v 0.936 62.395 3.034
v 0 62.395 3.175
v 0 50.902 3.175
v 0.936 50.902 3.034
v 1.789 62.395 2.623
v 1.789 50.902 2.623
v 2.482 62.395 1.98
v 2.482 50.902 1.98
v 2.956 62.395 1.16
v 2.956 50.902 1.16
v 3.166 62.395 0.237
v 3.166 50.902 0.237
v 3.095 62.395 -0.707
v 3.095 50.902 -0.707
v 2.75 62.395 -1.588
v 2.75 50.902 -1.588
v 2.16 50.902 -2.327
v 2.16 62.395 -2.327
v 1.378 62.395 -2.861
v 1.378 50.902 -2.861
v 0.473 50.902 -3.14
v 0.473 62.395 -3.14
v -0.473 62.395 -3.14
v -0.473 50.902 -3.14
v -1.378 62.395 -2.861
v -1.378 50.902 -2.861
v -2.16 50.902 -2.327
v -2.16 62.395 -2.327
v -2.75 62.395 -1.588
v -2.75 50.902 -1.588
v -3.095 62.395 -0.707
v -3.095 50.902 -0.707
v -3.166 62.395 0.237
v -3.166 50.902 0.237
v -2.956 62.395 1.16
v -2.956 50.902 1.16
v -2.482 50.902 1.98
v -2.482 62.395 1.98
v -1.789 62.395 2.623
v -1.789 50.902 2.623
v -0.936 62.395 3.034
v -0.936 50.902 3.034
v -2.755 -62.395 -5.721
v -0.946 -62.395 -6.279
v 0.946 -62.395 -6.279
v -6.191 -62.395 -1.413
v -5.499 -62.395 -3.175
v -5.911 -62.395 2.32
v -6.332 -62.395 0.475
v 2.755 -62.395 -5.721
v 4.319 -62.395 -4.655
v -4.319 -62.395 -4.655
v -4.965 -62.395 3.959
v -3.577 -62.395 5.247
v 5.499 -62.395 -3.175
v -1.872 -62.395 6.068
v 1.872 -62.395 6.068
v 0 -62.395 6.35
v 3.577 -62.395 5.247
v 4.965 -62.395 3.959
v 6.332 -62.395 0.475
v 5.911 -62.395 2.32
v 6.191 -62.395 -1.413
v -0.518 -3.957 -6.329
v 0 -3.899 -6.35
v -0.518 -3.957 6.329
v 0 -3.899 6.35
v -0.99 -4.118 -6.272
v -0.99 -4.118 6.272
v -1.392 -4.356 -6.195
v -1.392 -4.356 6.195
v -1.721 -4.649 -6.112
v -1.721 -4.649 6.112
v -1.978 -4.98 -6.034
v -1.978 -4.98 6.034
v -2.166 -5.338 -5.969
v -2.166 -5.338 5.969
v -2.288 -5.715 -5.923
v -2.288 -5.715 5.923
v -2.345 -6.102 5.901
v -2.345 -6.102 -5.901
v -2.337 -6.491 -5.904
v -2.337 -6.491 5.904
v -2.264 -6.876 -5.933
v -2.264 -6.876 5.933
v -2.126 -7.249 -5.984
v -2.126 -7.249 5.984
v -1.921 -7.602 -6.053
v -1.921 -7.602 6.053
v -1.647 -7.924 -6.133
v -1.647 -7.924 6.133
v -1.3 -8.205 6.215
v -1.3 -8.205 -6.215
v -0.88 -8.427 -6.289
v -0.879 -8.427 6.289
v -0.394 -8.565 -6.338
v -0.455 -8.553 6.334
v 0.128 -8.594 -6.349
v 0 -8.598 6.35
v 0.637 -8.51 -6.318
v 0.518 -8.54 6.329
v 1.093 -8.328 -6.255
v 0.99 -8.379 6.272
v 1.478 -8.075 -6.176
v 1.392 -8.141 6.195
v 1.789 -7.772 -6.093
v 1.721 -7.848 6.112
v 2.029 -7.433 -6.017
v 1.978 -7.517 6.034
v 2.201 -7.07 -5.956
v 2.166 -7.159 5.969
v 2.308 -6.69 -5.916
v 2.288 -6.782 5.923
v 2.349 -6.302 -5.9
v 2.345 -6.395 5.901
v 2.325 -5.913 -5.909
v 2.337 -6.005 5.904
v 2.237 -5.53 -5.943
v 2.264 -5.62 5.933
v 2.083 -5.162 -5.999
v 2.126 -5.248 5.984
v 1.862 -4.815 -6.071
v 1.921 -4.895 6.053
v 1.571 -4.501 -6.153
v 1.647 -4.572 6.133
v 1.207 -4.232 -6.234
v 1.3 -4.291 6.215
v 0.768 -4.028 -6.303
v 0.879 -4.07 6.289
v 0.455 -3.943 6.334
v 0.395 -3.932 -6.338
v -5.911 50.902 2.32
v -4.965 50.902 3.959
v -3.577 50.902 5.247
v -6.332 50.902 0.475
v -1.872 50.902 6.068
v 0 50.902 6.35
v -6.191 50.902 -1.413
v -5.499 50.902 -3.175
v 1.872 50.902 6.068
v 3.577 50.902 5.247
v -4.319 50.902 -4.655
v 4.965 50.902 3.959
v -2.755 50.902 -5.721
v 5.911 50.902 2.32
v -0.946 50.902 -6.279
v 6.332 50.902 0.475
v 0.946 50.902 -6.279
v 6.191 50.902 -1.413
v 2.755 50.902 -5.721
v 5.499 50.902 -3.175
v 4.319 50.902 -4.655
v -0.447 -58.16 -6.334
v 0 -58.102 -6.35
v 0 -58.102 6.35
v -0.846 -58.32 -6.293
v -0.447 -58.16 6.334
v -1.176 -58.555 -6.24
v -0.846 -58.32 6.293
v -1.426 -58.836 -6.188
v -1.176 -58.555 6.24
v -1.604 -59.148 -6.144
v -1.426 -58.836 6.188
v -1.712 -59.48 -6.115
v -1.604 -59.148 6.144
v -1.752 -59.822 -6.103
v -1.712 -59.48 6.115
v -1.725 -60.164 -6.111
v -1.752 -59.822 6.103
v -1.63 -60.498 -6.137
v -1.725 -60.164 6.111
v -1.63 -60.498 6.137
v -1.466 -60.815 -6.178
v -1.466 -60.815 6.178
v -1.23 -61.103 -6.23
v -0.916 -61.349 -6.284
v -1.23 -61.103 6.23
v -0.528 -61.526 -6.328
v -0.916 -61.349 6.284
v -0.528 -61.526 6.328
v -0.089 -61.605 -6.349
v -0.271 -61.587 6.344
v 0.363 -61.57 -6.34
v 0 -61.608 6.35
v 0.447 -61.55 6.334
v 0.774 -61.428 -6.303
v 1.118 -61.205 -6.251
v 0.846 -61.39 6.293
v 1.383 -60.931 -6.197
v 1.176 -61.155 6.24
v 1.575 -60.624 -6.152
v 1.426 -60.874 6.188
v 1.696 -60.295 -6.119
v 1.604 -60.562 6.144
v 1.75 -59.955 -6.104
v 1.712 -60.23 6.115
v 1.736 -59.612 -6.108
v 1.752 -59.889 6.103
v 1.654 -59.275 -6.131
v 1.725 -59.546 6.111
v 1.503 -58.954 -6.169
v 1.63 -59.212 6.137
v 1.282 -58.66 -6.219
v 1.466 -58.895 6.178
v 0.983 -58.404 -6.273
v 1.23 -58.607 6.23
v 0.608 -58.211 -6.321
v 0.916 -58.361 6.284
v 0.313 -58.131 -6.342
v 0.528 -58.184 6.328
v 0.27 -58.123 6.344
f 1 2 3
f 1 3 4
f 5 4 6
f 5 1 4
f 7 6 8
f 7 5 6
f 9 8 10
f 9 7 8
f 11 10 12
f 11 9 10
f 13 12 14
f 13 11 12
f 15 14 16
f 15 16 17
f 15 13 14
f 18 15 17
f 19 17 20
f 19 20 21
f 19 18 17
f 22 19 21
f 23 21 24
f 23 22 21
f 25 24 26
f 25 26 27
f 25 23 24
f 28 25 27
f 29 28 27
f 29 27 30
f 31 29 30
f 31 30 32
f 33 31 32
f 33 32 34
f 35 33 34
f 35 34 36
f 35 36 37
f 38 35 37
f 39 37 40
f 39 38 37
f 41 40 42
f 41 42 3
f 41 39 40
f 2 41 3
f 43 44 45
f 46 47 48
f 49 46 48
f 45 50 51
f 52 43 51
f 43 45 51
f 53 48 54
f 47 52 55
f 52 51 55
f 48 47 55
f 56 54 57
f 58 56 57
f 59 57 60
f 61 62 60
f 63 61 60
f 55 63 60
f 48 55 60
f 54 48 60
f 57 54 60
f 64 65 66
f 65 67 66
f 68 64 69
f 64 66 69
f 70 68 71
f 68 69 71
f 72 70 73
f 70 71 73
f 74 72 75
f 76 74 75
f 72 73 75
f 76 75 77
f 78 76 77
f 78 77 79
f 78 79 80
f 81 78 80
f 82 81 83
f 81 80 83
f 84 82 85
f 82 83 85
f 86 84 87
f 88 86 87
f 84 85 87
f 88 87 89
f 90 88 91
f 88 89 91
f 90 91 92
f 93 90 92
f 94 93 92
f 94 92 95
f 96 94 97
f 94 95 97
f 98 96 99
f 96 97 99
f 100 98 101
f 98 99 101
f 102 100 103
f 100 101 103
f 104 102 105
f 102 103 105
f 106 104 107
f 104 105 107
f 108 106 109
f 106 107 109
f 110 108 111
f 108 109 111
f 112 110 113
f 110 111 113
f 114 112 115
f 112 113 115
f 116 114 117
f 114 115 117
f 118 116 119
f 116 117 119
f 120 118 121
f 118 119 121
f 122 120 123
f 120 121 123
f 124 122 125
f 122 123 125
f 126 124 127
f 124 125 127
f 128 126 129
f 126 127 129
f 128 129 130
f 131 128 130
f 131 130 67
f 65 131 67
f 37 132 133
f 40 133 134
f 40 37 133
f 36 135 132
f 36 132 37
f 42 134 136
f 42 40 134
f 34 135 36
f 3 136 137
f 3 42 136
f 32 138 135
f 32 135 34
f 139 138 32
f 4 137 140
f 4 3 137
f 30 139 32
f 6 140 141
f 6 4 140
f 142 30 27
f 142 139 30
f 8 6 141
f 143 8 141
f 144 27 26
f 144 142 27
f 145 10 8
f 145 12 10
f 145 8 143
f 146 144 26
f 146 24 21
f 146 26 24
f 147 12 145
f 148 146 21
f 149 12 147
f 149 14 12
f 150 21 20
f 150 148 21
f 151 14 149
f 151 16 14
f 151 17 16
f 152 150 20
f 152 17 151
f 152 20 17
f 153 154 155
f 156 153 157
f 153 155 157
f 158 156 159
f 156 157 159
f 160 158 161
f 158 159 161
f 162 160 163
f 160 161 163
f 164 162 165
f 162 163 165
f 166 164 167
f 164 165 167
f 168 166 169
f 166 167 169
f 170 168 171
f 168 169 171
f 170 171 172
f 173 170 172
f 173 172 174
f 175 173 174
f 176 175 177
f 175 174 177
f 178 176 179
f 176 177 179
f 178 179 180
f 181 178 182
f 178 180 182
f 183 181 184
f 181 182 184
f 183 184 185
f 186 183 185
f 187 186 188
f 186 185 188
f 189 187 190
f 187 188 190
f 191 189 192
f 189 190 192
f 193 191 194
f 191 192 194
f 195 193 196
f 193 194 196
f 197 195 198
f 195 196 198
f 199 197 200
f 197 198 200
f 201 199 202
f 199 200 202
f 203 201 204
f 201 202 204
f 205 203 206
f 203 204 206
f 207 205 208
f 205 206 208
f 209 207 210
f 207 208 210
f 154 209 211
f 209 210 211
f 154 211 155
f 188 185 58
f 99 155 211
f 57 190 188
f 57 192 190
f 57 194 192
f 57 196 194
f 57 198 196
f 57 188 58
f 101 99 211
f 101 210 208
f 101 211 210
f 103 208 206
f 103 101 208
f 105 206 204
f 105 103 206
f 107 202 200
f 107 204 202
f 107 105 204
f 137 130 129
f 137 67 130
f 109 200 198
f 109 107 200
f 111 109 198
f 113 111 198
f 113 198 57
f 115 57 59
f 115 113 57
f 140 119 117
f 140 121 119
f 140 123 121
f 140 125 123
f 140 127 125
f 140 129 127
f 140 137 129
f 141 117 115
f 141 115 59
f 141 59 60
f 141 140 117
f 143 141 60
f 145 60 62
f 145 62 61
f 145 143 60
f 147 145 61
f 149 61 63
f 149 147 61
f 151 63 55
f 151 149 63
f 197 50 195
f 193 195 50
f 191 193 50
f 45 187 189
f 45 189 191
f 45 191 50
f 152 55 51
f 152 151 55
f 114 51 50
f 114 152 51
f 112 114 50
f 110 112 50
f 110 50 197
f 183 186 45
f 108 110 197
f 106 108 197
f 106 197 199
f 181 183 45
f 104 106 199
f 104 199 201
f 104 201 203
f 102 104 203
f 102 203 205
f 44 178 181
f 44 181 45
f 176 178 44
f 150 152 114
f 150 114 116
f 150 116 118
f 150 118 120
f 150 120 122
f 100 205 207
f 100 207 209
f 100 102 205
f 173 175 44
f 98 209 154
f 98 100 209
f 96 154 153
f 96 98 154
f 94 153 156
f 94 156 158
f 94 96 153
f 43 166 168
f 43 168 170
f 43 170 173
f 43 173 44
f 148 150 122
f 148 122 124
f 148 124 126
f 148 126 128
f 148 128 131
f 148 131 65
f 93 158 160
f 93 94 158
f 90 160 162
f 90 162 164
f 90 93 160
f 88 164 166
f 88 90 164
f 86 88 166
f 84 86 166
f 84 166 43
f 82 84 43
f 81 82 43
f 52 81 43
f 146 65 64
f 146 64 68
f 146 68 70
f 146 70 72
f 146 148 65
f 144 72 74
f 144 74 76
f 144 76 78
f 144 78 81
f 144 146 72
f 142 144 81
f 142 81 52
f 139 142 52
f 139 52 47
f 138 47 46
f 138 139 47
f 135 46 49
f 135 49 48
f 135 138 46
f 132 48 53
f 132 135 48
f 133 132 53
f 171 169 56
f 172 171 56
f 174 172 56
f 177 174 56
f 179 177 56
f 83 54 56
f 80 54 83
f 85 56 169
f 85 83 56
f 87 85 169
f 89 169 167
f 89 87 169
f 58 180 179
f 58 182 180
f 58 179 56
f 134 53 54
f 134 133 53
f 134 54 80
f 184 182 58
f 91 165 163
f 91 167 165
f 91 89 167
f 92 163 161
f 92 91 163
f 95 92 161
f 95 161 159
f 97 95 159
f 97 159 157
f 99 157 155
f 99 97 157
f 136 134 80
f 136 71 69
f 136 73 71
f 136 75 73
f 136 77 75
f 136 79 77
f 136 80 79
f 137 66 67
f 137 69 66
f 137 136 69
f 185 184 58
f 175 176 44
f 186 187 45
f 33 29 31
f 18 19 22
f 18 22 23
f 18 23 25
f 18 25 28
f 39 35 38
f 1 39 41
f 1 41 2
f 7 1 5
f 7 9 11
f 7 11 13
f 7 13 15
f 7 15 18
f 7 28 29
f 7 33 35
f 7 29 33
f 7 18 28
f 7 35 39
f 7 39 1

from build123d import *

# Parameters (mm, degrees)
SKETCH1_R           = 6.35
BOSS_EXTRUDE1_DEPTH = 62.3951
SKETCH3_OUTSIDE_W   = 39.916
SKETCH3_OUTSIDE_H   = 39.916
SKETCH3_OUTSIDE_R   = 3.175
CUT_EXTRUDE1_DEPTH  = 11.4935
SKETCH7_R           = 1.7526
CUT_EXTRUDE3_DEPTH  = 9.525
SKETCH10_R          = 2.3495
CUT_EXTRUDE6_DEPTH  = 6.35


with BuildPart() as part:
    # Sketch1 → Boss-Extrude1 (new, symmetric)
    with BuildSketch(Plane(origin=(0, 0, 0), x_dir=(1, 0, 0), z_dir=(0, 1, 0))):
        with Locations(Location((0, 0, 0), (0, 0, 270))):
            Circle(SKETCH1_R)
    extrude(amount=BOSS_EXTRUDE1_DEPTH, both=True)

    # Sketch3 outside → Cut-Extrude1 (cut)
    with BuildSketch(Plane(origin=(0, 62.3951, 0), x_dir=(1, 0, 0), z_dir=(0, 1, 0))):
        Rectangle(SKETCH3_OUTSIDE_W, SKETCH3_OUTSIDE_H)
        with Locations(Location((0, 0, 0), (0, 0, 270))):
            Circle(SKETCH3_OUTSIDE_R, mode=Mode.SUBTRACT)
    extrude(amount=-CUT_EXTRUDE1_DEPTH, mode=Mode.SUBTRACT)

    # Sketch7 → Cut-Extrude3 (cut, symmetric)
    with BuildSketch(Plane.XY):
        with Locations(Location((0, -59.8551, 0), (0, 0, 89.99999997))):
            Circle(SKETCH7_R)
    extrude(amount=CUT_EXTRUDE3_DEPTH, both=True, mode=Mode.SUBTRACT)

    # Sketch10 → Cut-Extrude6 (cut, symmetric)
    with BuildSketch(Plane.XY):
        with Locations(Location((0, -6.2484, 0), (0, 0, 90.000000013))):
            Circle(SKETCH10_R)
    extrude(amount=CUT_EXTRUDE6_DEPTH, both=True, mode=Mode.SUBTRACT)


solid = part.part
